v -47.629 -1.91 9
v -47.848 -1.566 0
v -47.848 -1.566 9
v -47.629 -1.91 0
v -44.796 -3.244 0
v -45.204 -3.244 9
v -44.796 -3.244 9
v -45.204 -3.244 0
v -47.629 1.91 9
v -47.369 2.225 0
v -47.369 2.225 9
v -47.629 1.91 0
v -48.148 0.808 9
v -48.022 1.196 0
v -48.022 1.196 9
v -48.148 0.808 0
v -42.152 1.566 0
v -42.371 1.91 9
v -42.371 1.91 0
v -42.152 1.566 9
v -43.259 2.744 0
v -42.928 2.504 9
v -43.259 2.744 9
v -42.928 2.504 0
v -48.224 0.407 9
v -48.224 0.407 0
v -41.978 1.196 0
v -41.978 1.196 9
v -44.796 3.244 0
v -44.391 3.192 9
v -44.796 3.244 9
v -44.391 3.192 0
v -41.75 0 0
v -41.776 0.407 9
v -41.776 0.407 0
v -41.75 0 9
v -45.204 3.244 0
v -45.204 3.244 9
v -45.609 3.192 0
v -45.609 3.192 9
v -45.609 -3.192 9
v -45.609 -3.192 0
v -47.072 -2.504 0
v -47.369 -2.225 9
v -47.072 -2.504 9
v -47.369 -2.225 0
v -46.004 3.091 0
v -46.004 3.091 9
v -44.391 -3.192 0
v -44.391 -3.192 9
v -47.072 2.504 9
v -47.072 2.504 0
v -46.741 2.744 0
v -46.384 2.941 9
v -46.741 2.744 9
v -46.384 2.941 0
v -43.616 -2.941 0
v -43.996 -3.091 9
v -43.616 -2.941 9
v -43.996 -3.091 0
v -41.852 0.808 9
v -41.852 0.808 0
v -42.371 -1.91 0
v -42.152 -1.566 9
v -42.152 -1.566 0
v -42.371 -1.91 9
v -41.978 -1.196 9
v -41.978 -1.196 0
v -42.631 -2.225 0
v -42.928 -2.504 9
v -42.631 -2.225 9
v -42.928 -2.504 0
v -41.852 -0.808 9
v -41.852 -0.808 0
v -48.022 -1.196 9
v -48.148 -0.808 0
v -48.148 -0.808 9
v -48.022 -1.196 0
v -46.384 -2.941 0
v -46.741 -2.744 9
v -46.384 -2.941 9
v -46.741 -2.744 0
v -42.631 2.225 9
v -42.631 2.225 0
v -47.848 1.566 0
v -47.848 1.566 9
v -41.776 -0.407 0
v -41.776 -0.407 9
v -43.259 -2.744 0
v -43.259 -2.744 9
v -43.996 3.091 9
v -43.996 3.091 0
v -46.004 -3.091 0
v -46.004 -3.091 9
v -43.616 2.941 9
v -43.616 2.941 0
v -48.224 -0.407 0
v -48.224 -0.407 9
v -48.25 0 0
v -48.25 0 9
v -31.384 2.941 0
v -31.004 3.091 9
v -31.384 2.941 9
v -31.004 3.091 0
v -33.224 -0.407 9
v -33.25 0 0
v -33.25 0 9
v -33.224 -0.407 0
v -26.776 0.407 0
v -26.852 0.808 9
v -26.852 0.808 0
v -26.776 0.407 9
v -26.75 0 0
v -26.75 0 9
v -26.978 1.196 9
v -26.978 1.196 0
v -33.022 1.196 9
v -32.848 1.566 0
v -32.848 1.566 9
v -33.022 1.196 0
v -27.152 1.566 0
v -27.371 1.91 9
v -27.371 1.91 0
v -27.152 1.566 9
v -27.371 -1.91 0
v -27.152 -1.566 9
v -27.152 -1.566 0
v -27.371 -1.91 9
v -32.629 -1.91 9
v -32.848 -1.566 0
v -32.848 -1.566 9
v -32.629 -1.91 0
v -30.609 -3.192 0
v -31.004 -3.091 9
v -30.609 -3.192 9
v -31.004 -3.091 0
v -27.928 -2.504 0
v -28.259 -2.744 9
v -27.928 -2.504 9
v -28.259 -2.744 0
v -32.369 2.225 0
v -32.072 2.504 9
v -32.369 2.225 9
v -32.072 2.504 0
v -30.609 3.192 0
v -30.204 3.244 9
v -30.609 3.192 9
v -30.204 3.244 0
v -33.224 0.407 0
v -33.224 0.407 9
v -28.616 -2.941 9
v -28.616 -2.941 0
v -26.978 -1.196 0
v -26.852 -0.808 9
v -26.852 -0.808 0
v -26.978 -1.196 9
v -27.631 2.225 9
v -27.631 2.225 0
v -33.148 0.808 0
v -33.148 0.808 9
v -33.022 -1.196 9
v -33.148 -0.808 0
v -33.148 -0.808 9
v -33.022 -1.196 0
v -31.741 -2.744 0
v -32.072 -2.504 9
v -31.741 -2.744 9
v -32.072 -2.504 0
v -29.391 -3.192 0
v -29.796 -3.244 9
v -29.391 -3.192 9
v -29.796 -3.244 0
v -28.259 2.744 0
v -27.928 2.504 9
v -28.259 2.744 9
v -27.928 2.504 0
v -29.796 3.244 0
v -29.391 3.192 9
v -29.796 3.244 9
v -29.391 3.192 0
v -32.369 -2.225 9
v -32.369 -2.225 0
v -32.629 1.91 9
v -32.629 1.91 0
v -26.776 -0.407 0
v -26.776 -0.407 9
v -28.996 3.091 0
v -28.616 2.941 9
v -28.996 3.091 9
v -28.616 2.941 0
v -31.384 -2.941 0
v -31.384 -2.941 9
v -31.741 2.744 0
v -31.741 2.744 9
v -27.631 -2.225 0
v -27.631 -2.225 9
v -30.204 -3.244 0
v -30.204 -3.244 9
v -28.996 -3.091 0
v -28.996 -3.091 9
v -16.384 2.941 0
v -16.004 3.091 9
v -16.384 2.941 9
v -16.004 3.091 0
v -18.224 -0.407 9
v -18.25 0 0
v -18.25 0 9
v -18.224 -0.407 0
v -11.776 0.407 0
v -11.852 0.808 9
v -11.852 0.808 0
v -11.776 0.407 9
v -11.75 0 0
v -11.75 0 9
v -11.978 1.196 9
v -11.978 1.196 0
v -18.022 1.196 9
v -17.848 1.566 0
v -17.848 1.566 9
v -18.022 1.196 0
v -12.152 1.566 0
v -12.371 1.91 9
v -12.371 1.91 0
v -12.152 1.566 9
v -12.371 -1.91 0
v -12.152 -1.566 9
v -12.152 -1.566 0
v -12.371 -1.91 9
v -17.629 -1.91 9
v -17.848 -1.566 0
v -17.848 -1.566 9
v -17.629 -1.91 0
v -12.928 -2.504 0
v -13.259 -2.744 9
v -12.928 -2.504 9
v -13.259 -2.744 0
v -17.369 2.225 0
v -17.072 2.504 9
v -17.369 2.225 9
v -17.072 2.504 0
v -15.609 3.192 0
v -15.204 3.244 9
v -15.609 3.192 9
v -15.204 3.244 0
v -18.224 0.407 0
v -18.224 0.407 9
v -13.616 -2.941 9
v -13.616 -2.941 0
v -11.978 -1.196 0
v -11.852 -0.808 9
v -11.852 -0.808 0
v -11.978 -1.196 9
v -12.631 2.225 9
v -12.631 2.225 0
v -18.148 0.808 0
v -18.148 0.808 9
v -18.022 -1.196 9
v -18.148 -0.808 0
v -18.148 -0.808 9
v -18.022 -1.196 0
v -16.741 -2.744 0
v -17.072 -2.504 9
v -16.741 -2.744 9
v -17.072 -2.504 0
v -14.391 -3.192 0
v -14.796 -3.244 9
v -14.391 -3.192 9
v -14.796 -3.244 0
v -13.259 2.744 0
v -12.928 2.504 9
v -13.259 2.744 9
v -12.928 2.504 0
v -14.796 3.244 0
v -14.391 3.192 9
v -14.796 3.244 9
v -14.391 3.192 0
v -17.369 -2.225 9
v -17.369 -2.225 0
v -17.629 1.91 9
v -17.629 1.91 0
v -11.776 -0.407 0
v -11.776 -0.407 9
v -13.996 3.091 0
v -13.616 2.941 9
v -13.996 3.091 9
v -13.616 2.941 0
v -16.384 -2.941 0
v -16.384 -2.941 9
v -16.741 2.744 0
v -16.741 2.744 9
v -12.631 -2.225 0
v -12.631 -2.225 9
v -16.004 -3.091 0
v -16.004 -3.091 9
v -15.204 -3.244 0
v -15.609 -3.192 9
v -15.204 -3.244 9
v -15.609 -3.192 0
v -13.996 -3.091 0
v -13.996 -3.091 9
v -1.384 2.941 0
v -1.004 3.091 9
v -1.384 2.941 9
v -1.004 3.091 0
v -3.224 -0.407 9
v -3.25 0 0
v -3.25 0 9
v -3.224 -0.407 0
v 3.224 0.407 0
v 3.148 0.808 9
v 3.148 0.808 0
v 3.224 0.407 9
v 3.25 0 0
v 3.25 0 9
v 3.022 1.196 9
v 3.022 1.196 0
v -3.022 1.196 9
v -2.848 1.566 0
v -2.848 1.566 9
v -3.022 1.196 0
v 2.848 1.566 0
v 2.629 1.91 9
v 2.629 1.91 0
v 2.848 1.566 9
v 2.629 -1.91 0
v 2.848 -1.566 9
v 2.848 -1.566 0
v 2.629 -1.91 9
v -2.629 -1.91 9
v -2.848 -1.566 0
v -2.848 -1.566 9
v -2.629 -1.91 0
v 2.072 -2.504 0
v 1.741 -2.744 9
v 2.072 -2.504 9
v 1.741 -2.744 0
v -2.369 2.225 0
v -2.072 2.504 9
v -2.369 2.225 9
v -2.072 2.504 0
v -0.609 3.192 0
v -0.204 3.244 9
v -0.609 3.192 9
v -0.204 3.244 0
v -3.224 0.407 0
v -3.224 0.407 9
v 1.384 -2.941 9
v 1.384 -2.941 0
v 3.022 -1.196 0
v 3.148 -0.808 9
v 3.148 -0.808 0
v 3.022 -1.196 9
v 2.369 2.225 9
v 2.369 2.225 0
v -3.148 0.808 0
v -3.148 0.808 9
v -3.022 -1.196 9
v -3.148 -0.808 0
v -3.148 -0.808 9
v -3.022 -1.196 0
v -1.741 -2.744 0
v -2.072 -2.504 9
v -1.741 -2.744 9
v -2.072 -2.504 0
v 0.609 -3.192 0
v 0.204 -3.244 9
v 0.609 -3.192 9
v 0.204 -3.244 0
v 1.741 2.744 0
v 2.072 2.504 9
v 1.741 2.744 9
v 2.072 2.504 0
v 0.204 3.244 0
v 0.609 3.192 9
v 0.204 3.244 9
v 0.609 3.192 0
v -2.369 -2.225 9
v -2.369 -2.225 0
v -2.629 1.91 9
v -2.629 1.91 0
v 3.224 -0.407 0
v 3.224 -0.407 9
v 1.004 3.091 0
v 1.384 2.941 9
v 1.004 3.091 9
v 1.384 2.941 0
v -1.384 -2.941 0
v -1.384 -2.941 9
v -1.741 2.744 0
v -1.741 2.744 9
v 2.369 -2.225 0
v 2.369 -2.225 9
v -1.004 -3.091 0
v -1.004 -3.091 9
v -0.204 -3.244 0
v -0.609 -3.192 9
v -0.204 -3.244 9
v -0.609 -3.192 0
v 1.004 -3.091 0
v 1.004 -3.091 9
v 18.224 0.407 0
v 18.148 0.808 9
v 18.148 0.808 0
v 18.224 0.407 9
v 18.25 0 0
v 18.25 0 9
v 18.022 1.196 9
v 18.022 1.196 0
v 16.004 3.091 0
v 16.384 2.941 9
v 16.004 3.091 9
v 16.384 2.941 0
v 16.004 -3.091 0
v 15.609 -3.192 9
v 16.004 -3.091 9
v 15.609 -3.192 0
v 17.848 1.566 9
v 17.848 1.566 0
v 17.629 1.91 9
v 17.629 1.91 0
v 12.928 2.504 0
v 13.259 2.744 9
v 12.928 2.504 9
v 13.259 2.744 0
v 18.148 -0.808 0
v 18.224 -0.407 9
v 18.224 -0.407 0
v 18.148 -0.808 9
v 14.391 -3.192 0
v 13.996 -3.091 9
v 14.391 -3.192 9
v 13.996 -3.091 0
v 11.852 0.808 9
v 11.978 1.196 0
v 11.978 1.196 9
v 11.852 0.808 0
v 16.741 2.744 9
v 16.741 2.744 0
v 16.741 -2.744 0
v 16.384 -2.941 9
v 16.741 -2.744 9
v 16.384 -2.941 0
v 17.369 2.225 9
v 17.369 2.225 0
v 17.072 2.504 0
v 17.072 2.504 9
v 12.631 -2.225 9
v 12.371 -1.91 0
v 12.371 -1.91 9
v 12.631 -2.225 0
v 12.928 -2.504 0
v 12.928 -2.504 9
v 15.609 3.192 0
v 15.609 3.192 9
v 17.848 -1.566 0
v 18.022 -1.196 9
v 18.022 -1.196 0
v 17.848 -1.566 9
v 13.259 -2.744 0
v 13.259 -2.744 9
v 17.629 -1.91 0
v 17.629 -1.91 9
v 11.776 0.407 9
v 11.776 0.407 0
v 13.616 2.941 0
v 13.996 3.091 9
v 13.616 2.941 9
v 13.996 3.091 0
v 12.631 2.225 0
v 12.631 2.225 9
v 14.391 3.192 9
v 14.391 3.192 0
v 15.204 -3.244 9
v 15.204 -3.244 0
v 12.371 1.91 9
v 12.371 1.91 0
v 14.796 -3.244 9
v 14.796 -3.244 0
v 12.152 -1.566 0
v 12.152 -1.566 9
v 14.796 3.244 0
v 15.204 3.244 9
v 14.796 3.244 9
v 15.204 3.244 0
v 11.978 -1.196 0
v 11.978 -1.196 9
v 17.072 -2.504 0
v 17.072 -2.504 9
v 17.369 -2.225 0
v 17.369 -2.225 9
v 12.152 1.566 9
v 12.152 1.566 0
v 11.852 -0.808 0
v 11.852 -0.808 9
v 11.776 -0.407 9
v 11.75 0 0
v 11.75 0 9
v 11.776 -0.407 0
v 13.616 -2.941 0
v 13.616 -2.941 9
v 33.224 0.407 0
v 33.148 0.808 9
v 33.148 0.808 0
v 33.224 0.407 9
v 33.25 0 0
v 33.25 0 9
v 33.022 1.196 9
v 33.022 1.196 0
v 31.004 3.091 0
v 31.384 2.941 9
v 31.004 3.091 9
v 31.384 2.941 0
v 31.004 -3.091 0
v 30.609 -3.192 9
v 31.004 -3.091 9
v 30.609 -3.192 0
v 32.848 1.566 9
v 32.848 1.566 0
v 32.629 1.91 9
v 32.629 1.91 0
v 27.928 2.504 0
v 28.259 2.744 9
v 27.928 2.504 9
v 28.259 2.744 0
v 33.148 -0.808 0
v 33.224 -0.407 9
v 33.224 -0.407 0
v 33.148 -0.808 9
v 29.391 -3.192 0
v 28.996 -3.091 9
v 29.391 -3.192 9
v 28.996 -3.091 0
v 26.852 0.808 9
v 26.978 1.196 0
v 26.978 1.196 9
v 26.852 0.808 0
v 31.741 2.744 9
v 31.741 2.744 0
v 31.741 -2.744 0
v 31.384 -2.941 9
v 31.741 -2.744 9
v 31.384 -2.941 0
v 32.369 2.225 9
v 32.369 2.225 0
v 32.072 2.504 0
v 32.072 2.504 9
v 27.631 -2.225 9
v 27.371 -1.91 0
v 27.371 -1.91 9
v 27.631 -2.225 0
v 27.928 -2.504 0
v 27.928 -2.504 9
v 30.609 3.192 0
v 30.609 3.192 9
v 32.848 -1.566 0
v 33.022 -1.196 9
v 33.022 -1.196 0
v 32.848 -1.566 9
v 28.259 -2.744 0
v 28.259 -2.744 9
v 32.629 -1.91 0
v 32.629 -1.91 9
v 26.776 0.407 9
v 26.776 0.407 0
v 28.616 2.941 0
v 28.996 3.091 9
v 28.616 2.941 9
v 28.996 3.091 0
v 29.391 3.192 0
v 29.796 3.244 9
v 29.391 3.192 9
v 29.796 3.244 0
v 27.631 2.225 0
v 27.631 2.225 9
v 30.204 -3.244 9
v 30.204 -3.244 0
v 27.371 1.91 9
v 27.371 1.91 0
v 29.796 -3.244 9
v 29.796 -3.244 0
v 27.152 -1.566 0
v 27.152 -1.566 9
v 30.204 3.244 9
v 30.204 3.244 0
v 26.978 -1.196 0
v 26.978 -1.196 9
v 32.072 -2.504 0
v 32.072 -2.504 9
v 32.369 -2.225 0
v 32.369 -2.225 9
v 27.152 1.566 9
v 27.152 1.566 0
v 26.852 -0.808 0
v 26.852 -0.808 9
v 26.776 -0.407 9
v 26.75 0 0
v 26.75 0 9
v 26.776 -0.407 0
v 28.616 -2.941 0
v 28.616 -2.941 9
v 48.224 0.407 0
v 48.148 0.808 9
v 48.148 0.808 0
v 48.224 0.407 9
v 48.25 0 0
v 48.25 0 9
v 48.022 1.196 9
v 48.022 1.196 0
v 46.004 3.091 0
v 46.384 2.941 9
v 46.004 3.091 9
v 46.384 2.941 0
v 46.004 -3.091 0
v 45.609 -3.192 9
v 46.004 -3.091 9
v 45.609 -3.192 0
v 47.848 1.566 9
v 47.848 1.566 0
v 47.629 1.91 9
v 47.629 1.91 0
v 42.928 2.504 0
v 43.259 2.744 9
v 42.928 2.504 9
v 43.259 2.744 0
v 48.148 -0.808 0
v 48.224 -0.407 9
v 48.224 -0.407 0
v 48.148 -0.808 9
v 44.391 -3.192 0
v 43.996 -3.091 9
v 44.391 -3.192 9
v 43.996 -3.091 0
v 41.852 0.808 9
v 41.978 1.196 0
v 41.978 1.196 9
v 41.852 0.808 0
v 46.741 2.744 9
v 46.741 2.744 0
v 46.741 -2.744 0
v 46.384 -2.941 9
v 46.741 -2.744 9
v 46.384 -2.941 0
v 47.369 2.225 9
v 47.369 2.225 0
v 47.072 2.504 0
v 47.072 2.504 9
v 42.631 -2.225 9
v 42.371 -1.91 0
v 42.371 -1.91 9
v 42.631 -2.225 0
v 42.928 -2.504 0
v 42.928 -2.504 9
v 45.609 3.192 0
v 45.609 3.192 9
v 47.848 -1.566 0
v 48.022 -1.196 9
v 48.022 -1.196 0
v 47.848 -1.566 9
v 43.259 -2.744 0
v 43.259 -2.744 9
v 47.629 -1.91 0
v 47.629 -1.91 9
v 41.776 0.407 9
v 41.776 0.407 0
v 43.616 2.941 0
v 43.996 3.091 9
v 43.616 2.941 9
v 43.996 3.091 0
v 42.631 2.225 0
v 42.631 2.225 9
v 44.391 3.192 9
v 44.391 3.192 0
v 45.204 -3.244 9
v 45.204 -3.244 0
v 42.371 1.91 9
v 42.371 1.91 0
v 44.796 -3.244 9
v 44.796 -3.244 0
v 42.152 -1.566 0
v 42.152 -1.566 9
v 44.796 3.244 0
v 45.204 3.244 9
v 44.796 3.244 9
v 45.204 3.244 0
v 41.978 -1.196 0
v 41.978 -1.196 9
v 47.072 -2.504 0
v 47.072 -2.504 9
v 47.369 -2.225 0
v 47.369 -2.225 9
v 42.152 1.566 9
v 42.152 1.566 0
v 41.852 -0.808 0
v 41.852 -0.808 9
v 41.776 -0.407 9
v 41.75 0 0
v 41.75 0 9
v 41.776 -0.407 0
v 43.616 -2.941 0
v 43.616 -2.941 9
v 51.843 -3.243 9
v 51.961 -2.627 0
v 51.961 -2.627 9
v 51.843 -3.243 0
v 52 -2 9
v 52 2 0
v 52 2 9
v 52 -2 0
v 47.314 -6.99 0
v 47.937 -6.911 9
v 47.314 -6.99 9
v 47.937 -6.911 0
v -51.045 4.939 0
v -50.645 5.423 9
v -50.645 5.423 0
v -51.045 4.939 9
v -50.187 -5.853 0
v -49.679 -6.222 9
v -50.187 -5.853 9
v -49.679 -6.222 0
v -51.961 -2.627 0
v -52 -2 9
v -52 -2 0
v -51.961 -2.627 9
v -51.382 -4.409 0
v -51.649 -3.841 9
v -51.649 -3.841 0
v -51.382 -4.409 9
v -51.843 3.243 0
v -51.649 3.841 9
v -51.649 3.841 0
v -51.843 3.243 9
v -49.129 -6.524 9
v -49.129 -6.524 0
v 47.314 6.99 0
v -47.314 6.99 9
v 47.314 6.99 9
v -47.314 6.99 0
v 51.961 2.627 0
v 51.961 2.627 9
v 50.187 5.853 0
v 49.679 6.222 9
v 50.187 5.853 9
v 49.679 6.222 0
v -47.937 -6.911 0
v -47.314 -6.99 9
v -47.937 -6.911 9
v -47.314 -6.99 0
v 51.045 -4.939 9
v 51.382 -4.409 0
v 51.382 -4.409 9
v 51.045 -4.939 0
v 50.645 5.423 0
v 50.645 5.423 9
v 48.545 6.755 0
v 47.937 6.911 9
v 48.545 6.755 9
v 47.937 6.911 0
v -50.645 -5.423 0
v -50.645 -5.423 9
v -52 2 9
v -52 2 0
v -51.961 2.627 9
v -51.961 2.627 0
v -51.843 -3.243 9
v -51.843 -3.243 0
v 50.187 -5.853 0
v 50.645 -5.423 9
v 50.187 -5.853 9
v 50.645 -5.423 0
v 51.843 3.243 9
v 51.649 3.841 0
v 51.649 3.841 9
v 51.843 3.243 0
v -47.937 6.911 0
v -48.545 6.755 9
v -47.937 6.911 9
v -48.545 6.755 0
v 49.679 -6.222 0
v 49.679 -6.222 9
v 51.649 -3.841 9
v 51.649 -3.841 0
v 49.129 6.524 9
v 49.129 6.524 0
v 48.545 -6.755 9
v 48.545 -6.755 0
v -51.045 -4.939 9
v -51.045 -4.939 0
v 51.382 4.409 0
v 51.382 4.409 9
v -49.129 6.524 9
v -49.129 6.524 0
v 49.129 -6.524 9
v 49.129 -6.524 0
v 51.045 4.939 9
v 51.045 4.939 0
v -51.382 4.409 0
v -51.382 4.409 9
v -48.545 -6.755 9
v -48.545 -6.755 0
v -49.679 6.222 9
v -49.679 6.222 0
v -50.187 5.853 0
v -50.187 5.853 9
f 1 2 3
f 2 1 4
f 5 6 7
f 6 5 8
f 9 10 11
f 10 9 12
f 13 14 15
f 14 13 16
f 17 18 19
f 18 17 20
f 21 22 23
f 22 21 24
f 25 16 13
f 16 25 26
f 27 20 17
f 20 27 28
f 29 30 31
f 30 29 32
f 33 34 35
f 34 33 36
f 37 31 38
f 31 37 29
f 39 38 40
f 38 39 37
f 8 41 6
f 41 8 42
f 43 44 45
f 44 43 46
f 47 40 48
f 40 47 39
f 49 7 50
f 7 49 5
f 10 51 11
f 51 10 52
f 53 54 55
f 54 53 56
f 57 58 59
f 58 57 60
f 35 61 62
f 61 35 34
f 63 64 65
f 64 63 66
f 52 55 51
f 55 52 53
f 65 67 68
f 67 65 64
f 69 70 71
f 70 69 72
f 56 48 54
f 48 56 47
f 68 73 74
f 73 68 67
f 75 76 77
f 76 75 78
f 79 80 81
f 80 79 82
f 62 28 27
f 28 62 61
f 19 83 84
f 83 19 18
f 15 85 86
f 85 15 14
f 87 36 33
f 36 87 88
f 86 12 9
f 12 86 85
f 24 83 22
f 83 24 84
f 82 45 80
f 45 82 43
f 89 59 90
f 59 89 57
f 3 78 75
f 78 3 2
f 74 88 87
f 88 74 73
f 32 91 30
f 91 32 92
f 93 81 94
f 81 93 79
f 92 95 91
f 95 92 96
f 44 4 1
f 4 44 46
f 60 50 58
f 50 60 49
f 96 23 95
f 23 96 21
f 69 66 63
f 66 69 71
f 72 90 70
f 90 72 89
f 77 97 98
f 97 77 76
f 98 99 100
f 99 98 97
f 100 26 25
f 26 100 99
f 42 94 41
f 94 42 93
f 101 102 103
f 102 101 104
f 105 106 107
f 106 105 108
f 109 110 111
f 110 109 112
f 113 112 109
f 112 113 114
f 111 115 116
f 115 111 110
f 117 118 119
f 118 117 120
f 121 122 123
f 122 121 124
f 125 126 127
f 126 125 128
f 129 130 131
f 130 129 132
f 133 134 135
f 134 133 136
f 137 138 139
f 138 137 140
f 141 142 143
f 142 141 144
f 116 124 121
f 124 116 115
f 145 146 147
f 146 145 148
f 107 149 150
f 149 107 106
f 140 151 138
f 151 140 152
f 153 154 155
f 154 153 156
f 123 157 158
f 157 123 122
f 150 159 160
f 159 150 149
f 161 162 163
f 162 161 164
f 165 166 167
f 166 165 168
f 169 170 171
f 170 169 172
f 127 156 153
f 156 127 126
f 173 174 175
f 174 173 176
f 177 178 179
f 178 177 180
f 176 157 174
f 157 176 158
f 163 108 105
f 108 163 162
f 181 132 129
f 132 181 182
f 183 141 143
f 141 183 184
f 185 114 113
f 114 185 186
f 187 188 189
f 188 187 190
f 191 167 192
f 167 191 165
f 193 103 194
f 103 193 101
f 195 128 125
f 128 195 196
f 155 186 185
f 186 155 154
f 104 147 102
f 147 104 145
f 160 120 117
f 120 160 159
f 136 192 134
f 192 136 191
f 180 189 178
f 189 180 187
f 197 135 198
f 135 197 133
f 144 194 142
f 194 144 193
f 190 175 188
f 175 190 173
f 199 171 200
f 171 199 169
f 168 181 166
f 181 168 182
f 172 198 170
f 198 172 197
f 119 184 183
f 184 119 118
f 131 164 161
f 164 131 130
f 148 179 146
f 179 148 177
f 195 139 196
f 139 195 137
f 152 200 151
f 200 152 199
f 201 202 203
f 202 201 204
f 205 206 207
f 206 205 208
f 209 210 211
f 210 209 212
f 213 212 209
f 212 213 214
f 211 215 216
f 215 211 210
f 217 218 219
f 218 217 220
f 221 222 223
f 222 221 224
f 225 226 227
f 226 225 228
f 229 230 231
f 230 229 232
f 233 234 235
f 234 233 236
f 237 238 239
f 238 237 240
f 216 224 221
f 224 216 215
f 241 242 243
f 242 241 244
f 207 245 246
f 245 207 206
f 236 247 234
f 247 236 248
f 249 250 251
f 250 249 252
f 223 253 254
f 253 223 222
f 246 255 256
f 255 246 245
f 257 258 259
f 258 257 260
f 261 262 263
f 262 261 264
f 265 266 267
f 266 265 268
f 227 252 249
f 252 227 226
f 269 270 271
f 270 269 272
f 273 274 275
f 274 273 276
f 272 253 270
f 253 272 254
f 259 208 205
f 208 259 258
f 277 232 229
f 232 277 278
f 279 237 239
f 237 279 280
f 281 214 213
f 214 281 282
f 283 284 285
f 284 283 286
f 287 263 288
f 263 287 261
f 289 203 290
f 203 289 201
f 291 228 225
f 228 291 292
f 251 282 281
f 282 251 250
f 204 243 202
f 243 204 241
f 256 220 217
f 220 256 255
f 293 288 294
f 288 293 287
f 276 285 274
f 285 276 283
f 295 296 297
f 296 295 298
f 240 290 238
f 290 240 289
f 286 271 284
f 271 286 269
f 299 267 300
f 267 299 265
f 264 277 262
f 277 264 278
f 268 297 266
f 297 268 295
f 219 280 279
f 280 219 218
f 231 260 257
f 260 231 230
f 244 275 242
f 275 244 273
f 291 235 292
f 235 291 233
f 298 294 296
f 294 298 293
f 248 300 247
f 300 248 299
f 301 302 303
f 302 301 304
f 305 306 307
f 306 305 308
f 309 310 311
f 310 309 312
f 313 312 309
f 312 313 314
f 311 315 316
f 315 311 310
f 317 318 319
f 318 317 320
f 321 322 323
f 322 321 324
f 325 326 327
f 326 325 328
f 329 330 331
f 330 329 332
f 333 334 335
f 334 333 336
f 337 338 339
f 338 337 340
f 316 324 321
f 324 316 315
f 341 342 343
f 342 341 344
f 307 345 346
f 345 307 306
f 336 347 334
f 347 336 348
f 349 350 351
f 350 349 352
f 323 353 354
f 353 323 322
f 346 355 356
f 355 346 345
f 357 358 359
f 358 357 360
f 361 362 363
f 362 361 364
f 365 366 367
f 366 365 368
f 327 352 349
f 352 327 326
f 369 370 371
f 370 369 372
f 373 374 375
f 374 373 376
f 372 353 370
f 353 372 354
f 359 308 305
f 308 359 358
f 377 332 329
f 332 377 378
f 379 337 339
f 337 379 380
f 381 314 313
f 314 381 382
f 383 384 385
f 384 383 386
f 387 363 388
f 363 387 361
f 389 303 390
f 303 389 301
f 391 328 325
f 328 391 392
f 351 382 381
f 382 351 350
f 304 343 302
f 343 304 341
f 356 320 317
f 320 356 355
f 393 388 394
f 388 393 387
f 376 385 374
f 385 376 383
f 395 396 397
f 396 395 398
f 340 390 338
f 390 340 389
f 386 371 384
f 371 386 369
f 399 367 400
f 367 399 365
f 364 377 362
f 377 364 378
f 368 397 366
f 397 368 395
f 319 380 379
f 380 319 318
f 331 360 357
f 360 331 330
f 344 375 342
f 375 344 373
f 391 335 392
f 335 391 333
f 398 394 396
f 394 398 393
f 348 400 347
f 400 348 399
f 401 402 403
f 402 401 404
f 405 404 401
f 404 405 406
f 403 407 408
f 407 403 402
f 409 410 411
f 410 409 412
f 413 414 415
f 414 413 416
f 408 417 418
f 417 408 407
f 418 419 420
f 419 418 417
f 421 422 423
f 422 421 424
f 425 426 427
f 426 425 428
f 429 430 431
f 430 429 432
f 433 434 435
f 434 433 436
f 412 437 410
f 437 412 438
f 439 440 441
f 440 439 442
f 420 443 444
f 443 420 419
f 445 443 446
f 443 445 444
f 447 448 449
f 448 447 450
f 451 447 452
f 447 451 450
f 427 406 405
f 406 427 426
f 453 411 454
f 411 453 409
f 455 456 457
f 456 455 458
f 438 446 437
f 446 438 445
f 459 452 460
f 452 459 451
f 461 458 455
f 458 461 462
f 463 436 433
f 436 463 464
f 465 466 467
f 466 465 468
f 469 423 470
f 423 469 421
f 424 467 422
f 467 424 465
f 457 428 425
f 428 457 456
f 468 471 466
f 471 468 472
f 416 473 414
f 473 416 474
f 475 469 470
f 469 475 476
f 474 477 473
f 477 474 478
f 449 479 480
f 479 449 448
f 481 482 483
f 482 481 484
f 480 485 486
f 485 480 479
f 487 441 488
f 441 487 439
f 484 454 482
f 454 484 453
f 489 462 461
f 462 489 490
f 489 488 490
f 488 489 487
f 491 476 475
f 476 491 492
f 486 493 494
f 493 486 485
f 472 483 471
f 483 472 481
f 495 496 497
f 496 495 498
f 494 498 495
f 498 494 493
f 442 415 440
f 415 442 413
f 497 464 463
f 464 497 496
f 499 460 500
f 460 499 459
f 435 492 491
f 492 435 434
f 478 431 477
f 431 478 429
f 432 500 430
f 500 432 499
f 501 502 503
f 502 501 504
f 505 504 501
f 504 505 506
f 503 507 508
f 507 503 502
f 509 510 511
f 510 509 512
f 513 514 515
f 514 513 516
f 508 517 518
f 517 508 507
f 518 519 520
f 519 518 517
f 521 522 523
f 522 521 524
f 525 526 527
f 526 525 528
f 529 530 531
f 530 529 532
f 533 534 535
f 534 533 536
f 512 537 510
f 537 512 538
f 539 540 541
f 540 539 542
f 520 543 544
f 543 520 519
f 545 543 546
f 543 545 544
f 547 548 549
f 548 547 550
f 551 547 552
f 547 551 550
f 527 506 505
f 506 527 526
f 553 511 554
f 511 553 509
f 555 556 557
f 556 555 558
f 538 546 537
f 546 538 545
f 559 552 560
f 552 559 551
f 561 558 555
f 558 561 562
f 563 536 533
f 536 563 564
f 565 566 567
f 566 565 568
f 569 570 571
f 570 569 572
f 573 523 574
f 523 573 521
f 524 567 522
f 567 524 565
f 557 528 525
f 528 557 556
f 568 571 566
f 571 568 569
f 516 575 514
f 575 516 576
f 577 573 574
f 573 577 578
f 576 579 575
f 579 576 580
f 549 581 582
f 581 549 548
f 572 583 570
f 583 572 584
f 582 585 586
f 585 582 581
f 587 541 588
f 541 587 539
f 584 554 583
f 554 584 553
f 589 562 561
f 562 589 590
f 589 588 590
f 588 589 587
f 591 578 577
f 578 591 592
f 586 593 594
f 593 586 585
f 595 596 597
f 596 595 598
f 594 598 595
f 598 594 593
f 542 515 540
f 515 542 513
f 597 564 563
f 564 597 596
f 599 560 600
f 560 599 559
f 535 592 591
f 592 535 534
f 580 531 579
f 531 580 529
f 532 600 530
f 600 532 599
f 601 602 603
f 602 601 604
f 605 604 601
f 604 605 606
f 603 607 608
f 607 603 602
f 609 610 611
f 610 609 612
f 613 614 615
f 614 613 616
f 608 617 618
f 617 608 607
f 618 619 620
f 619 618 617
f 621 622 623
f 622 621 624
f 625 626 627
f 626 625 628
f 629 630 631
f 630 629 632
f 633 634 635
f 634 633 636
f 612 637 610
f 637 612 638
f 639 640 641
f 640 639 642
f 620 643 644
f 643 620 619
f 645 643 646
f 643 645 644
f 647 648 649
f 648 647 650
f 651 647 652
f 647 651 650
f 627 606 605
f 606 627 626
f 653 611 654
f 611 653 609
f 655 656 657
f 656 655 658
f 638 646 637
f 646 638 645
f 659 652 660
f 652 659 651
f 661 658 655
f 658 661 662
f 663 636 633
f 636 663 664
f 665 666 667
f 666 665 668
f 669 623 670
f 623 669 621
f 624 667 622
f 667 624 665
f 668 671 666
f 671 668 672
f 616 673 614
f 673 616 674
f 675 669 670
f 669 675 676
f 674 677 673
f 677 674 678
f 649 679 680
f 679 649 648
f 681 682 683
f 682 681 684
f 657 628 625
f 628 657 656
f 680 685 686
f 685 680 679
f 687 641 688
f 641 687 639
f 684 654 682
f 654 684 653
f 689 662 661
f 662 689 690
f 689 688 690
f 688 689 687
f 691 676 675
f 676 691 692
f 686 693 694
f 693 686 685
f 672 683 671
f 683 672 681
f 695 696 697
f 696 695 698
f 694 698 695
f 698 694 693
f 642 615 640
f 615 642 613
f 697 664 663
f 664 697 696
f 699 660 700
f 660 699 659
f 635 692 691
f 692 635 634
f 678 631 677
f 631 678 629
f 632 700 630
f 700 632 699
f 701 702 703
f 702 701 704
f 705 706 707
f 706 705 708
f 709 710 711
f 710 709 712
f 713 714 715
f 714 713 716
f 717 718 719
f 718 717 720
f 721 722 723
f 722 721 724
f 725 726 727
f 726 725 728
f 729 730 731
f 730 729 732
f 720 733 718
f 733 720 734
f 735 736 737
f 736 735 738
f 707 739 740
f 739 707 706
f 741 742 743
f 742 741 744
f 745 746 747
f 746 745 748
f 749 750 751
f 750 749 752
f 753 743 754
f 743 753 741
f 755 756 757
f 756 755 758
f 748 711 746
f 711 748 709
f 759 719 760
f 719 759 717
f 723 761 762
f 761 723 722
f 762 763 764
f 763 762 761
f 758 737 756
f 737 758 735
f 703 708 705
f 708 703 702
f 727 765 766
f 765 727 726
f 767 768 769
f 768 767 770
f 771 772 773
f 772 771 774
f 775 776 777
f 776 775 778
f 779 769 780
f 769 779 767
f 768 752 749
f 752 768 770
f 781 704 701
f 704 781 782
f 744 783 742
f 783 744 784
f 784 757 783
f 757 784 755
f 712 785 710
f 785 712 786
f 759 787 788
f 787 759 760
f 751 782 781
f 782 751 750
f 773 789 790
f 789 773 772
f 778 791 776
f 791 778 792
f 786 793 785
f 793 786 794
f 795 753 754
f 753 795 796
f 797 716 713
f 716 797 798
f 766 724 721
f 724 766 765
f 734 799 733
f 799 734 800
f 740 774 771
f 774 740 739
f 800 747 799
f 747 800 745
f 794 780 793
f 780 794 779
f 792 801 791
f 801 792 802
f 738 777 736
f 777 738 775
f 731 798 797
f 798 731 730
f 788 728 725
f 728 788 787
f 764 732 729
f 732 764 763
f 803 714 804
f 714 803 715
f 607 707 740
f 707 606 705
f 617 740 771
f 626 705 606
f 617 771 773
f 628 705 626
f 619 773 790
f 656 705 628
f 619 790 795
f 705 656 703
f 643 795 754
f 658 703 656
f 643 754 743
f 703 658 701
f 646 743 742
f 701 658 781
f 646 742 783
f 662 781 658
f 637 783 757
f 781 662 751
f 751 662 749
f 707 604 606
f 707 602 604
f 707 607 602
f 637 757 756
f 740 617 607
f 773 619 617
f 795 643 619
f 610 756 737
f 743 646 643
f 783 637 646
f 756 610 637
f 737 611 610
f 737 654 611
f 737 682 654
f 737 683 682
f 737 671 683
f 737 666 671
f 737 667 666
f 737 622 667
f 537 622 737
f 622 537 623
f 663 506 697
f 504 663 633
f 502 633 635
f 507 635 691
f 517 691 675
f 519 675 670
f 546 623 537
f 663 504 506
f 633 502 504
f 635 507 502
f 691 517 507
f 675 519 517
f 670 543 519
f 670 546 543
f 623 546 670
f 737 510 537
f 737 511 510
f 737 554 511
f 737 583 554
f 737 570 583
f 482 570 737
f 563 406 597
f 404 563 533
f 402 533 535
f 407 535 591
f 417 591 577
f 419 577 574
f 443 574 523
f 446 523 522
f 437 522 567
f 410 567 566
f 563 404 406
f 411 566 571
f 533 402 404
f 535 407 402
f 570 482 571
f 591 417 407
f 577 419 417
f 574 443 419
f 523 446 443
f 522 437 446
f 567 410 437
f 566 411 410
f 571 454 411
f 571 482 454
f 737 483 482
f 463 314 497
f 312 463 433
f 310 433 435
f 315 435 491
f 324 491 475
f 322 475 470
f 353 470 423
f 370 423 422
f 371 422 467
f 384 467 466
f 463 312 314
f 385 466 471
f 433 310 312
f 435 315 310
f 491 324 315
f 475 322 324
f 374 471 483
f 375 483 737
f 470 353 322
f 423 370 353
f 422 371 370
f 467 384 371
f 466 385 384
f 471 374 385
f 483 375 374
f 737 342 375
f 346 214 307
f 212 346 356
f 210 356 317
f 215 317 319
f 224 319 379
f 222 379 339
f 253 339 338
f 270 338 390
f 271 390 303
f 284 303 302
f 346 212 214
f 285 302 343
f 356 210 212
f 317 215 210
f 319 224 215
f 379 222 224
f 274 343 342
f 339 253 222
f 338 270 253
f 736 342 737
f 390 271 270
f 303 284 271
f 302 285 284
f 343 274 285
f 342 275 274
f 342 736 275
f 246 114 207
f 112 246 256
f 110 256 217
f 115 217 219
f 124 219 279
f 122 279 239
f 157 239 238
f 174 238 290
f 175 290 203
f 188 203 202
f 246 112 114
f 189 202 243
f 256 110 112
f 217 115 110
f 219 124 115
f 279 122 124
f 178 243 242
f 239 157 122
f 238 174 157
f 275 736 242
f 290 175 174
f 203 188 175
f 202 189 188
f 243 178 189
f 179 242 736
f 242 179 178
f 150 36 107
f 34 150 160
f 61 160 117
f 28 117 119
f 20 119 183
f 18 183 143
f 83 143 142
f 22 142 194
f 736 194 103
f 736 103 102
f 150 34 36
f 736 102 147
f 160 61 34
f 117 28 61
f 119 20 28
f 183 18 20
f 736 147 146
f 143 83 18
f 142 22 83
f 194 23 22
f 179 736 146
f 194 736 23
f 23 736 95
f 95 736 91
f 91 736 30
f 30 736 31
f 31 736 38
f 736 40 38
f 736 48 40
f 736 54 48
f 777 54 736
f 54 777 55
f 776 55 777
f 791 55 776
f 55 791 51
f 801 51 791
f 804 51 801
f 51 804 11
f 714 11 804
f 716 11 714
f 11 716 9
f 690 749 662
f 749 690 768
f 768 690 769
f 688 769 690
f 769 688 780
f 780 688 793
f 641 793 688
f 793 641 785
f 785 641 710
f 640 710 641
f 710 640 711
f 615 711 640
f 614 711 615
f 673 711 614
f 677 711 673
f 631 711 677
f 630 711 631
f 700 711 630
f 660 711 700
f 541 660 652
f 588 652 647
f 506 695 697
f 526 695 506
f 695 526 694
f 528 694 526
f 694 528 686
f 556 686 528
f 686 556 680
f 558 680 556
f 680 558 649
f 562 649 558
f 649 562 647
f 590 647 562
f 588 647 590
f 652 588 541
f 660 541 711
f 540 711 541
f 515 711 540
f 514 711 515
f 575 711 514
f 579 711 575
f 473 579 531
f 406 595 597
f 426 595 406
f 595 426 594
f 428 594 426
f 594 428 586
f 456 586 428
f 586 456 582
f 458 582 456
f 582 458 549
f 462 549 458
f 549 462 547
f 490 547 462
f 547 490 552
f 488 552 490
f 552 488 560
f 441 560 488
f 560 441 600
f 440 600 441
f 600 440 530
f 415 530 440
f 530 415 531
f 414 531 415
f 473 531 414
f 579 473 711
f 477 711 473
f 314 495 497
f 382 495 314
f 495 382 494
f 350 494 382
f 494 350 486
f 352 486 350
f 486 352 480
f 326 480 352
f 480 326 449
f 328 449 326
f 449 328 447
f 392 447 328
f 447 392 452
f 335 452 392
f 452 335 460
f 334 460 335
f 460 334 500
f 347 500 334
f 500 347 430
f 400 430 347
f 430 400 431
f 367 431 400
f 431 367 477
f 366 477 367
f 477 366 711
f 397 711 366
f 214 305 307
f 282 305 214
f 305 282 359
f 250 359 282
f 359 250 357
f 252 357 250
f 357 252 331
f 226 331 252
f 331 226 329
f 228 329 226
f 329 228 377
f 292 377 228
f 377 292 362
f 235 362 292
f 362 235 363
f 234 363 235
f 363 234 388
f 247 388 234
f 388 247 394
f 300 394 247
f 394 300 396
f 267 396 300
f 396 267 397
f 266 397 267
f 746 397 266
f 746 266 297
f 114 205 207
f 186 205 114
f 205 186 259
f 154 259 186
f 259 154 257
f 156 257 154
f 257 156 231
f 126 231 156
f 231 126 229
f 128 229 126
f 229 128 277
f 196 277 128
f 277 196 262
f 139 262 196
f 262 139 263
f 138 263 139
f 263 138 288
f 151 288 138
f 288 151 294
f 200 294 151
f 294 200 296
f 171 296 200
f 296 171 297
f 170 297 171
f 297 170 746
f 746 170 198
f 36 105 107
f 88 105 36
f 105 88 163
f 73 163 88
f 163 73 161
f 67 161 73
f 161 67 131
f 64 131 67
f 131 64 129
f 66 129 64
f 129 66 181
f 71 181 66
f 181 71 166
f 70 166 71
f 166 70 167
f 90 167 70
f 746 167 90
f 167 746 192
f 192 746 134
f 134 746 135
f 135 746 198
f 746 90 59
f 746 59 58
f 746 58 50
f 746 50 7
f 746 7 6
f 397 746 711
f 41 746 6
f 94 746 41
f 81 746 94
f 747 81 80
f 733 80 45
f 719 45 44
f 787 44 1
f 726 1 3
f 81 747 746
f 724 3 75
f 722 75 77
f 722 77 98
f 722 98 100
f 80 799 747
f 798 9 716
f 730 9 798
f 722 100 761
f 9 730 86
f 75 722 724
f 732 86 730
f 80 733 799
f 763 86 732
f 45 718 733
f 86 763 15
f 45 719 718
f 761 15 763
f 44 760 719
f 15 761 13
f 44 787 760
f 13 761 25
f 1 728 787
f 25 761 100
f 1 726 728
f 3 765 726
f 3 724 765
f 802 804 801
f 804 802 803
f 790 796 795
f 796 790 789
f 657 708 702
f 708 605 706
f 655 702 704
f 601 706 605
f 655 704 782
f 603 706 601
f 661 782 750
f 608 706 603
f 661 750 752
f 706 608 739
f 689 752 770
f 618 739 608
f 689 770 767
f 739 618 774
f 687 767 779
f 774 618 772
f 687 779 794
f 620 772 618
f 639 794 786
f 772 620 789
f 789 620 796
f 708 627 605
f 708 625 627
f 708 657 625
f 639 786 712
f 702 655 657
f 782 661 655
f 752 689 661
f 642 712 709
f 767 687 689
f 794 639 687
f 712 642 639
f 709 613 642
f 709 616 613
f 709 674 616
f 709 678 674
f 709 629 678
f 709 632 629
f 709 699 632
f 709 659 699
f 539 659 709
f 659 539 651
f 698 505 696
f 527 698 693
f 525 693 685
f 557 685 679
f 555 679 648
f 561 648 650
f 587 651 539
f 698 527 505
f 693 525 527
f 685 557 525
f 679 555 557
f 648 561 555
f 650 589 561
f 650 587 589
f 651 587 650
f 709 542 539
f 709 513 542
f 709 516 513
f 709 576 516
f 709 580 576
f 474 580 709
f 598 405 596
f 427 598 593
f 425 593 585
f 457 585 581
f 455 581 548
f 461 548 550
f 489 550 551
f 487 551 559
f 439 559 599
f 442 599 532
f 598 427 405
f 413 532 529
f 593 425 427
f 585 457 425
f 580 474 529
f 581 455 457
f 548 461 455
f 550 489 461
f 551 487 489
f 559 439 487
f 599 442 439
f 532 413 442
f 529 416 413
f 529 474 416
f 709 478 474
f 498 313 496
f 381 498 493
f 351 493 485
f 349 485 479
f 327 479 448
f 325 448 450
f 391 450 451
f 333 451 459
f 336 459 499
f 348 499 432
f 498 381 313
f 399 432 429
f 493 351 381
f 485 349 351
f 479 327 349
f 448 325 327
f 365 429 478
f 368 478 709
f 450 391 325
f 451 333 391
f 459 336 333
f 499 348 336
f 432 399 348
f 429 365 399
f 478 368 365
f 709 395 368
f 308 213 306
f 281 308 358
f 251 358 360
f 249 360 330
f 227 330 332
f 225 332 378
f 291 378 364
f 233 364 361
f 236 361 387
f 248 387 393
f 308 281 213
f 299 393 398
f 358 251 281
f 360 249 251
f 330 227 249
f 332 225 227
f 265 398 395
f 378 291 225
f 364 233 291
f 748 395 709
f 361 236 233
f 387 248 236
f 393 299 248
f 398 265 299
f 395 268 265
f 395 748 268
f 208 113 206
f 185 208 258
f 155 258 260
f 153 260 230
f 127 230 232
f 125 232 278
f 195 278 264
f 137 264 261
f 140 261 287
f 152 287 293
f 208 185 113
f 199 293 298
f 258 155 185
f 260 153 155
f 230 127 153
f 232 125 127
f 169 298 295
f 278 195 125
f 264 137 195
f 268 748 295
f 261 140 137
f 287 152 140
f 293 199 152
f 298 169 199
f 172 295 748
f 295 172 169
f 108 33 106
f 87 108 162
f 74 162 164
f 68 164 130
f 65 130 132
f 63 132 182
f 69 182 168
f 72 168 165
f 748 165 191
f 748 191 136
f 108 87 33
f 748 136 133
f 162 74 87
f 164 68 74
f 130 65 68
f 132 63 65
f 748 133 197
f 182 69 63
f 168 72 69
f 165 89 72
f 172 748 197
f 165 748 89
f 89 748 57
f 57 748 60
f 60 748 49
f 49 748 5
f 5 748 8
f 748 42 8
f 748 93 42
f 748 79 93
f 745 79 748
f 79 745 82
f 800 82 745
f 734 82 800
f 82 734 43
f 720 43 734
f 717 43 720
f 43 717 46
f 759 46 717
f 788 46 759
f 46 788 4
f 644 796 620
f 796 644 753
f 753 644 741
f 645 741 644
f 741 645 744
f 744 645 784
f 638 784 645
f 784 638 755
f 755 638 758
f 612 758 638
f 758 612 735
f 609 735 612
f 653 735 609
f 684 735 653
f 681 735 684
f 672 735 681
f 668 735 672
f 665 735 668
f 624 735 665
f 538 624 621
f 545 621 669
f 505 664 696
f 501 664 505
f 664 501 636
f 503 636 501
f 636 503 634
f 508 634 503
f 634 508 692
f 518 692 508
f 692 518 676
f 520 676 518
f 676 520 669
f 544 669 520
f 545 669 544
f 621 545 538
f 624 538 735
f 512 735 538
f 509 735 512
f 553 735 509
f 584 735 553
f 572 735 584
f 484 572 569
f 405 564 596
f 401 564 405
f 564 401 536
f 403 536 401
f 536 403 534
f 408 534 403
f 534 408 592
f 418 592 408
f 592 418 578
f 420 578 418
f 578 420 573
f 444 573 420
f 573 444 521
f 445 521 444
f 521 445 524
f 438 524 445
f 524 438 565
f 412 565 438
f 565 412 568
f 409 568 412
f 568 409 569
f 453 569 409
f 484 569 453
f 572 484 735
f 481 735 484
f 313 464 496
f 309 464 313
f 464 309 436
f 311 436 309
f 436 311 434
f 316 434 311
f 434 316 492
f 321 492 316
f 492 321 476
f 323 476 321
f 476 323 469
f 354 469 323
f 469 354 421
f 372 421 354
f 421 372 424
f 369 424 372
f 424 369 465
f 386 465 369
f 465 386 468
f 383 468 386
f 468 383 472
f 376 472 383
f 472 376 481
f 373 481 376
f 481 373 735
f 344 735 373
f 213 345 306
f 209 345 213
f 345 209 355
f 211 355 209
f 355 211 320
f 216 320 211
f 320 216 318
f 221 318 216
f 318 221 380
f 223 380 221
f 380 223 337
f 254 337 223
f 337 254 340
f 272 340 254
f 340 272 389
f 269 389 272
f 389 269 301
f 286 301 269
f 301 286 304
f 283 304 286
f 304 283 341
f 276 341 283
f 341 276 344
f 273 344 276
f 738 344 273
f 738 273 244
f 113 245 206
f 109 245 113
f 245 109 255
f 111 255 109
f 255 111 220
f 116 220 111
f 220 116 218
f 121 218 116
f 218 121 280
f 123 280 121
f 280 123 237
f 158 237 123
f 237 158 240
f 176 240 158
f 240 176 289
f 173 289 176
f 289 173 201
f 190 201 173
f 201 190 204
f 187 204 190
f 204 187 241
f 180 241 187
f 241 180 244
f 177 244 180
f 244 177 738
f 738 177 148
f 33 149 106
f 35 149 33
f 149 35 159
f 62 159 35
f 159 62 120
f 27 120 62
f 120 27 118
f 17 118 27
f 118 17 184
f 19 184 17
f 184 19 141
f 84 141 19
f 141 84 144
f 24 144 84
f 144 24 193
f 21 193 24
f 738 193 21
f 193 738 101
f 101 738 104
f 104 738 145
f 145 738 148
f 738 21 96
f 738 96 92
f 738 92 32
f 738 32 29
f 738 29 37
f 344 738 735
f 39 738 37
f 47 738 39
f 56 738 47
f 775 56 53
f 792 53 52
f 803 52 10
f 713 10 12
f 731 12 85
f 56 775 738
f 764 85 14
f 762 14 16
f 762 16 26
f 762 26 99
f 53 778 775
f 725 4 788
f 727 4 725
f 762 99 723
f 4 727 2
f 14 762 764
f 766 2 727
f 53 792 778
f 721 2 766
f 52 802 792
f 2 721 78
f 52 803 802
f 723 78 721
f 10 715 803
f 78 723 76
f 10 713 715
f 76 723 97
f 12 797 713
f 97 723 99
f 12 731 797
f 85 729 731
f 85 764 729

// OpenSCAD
$fn = 50;


difference() {
	union() {
		hull() {
			translate(v = [-47.0000000000, 2.0000000000, 0]) {
				cylinder(h = 9, r = 5);
			}
			translate(v = [47.0000000000, 2.0000000000, 0]) {
				cylinder(h = 9, r = 5);
			}
			translate(v = [-47.0000000000, -2.0000000000, 0]) {
				cylinder(h = 9, r = 5);
			}
			translate(v = [47.0000000000, -2.0000000000, 0]) {
				cylinder(h = 9, r = 5);
			}
		}
	}
	union() {
		translate(v = [-45.0000000000, 0.0000000000, 0]) {
			translate(v = [0, 0, -100]) {
				cylinder(h = 200, r = 3.2500000000);
			}
		}
		translate(v = [-30.0000000000, 0.0000000000, 0]) {
			translate(v = [0, 0, -100]) {
				cylinder(h = 200, r = 3.2500000000);
			}
		}
		translate(v = [-15.0000000000, 0.0000000000, 0]) {
			translate(v = [0, 0, -100]) {
				cylinder(h = 200, r = 3.2500000000);
			}
		}
		translate(v = [0, 0, -100]) {
			cylinder(h = 200, r = 3.2500000000);
		}
		translate(v = [15.0000000000, 0.0000000000, 0]) {
			translate(v = [0, 0, -100]) {
				cylinder(h = 200, r = 3.2500000000);
			}
		}
		translate(v = [30.0000000000, 0.0000000000, 0]) {
			translate(v = [0, 0, -100]) {
				cylinder(h = 200, r = 3.2500000000);
			}
		}
		translate(v = [45.0000000000, 0.0000000000, 0]) {
			translate(v = [0, 0, -100]) {
				cylinder(h = 200, r = 3.2500000000);
			}
		}
	}
}
